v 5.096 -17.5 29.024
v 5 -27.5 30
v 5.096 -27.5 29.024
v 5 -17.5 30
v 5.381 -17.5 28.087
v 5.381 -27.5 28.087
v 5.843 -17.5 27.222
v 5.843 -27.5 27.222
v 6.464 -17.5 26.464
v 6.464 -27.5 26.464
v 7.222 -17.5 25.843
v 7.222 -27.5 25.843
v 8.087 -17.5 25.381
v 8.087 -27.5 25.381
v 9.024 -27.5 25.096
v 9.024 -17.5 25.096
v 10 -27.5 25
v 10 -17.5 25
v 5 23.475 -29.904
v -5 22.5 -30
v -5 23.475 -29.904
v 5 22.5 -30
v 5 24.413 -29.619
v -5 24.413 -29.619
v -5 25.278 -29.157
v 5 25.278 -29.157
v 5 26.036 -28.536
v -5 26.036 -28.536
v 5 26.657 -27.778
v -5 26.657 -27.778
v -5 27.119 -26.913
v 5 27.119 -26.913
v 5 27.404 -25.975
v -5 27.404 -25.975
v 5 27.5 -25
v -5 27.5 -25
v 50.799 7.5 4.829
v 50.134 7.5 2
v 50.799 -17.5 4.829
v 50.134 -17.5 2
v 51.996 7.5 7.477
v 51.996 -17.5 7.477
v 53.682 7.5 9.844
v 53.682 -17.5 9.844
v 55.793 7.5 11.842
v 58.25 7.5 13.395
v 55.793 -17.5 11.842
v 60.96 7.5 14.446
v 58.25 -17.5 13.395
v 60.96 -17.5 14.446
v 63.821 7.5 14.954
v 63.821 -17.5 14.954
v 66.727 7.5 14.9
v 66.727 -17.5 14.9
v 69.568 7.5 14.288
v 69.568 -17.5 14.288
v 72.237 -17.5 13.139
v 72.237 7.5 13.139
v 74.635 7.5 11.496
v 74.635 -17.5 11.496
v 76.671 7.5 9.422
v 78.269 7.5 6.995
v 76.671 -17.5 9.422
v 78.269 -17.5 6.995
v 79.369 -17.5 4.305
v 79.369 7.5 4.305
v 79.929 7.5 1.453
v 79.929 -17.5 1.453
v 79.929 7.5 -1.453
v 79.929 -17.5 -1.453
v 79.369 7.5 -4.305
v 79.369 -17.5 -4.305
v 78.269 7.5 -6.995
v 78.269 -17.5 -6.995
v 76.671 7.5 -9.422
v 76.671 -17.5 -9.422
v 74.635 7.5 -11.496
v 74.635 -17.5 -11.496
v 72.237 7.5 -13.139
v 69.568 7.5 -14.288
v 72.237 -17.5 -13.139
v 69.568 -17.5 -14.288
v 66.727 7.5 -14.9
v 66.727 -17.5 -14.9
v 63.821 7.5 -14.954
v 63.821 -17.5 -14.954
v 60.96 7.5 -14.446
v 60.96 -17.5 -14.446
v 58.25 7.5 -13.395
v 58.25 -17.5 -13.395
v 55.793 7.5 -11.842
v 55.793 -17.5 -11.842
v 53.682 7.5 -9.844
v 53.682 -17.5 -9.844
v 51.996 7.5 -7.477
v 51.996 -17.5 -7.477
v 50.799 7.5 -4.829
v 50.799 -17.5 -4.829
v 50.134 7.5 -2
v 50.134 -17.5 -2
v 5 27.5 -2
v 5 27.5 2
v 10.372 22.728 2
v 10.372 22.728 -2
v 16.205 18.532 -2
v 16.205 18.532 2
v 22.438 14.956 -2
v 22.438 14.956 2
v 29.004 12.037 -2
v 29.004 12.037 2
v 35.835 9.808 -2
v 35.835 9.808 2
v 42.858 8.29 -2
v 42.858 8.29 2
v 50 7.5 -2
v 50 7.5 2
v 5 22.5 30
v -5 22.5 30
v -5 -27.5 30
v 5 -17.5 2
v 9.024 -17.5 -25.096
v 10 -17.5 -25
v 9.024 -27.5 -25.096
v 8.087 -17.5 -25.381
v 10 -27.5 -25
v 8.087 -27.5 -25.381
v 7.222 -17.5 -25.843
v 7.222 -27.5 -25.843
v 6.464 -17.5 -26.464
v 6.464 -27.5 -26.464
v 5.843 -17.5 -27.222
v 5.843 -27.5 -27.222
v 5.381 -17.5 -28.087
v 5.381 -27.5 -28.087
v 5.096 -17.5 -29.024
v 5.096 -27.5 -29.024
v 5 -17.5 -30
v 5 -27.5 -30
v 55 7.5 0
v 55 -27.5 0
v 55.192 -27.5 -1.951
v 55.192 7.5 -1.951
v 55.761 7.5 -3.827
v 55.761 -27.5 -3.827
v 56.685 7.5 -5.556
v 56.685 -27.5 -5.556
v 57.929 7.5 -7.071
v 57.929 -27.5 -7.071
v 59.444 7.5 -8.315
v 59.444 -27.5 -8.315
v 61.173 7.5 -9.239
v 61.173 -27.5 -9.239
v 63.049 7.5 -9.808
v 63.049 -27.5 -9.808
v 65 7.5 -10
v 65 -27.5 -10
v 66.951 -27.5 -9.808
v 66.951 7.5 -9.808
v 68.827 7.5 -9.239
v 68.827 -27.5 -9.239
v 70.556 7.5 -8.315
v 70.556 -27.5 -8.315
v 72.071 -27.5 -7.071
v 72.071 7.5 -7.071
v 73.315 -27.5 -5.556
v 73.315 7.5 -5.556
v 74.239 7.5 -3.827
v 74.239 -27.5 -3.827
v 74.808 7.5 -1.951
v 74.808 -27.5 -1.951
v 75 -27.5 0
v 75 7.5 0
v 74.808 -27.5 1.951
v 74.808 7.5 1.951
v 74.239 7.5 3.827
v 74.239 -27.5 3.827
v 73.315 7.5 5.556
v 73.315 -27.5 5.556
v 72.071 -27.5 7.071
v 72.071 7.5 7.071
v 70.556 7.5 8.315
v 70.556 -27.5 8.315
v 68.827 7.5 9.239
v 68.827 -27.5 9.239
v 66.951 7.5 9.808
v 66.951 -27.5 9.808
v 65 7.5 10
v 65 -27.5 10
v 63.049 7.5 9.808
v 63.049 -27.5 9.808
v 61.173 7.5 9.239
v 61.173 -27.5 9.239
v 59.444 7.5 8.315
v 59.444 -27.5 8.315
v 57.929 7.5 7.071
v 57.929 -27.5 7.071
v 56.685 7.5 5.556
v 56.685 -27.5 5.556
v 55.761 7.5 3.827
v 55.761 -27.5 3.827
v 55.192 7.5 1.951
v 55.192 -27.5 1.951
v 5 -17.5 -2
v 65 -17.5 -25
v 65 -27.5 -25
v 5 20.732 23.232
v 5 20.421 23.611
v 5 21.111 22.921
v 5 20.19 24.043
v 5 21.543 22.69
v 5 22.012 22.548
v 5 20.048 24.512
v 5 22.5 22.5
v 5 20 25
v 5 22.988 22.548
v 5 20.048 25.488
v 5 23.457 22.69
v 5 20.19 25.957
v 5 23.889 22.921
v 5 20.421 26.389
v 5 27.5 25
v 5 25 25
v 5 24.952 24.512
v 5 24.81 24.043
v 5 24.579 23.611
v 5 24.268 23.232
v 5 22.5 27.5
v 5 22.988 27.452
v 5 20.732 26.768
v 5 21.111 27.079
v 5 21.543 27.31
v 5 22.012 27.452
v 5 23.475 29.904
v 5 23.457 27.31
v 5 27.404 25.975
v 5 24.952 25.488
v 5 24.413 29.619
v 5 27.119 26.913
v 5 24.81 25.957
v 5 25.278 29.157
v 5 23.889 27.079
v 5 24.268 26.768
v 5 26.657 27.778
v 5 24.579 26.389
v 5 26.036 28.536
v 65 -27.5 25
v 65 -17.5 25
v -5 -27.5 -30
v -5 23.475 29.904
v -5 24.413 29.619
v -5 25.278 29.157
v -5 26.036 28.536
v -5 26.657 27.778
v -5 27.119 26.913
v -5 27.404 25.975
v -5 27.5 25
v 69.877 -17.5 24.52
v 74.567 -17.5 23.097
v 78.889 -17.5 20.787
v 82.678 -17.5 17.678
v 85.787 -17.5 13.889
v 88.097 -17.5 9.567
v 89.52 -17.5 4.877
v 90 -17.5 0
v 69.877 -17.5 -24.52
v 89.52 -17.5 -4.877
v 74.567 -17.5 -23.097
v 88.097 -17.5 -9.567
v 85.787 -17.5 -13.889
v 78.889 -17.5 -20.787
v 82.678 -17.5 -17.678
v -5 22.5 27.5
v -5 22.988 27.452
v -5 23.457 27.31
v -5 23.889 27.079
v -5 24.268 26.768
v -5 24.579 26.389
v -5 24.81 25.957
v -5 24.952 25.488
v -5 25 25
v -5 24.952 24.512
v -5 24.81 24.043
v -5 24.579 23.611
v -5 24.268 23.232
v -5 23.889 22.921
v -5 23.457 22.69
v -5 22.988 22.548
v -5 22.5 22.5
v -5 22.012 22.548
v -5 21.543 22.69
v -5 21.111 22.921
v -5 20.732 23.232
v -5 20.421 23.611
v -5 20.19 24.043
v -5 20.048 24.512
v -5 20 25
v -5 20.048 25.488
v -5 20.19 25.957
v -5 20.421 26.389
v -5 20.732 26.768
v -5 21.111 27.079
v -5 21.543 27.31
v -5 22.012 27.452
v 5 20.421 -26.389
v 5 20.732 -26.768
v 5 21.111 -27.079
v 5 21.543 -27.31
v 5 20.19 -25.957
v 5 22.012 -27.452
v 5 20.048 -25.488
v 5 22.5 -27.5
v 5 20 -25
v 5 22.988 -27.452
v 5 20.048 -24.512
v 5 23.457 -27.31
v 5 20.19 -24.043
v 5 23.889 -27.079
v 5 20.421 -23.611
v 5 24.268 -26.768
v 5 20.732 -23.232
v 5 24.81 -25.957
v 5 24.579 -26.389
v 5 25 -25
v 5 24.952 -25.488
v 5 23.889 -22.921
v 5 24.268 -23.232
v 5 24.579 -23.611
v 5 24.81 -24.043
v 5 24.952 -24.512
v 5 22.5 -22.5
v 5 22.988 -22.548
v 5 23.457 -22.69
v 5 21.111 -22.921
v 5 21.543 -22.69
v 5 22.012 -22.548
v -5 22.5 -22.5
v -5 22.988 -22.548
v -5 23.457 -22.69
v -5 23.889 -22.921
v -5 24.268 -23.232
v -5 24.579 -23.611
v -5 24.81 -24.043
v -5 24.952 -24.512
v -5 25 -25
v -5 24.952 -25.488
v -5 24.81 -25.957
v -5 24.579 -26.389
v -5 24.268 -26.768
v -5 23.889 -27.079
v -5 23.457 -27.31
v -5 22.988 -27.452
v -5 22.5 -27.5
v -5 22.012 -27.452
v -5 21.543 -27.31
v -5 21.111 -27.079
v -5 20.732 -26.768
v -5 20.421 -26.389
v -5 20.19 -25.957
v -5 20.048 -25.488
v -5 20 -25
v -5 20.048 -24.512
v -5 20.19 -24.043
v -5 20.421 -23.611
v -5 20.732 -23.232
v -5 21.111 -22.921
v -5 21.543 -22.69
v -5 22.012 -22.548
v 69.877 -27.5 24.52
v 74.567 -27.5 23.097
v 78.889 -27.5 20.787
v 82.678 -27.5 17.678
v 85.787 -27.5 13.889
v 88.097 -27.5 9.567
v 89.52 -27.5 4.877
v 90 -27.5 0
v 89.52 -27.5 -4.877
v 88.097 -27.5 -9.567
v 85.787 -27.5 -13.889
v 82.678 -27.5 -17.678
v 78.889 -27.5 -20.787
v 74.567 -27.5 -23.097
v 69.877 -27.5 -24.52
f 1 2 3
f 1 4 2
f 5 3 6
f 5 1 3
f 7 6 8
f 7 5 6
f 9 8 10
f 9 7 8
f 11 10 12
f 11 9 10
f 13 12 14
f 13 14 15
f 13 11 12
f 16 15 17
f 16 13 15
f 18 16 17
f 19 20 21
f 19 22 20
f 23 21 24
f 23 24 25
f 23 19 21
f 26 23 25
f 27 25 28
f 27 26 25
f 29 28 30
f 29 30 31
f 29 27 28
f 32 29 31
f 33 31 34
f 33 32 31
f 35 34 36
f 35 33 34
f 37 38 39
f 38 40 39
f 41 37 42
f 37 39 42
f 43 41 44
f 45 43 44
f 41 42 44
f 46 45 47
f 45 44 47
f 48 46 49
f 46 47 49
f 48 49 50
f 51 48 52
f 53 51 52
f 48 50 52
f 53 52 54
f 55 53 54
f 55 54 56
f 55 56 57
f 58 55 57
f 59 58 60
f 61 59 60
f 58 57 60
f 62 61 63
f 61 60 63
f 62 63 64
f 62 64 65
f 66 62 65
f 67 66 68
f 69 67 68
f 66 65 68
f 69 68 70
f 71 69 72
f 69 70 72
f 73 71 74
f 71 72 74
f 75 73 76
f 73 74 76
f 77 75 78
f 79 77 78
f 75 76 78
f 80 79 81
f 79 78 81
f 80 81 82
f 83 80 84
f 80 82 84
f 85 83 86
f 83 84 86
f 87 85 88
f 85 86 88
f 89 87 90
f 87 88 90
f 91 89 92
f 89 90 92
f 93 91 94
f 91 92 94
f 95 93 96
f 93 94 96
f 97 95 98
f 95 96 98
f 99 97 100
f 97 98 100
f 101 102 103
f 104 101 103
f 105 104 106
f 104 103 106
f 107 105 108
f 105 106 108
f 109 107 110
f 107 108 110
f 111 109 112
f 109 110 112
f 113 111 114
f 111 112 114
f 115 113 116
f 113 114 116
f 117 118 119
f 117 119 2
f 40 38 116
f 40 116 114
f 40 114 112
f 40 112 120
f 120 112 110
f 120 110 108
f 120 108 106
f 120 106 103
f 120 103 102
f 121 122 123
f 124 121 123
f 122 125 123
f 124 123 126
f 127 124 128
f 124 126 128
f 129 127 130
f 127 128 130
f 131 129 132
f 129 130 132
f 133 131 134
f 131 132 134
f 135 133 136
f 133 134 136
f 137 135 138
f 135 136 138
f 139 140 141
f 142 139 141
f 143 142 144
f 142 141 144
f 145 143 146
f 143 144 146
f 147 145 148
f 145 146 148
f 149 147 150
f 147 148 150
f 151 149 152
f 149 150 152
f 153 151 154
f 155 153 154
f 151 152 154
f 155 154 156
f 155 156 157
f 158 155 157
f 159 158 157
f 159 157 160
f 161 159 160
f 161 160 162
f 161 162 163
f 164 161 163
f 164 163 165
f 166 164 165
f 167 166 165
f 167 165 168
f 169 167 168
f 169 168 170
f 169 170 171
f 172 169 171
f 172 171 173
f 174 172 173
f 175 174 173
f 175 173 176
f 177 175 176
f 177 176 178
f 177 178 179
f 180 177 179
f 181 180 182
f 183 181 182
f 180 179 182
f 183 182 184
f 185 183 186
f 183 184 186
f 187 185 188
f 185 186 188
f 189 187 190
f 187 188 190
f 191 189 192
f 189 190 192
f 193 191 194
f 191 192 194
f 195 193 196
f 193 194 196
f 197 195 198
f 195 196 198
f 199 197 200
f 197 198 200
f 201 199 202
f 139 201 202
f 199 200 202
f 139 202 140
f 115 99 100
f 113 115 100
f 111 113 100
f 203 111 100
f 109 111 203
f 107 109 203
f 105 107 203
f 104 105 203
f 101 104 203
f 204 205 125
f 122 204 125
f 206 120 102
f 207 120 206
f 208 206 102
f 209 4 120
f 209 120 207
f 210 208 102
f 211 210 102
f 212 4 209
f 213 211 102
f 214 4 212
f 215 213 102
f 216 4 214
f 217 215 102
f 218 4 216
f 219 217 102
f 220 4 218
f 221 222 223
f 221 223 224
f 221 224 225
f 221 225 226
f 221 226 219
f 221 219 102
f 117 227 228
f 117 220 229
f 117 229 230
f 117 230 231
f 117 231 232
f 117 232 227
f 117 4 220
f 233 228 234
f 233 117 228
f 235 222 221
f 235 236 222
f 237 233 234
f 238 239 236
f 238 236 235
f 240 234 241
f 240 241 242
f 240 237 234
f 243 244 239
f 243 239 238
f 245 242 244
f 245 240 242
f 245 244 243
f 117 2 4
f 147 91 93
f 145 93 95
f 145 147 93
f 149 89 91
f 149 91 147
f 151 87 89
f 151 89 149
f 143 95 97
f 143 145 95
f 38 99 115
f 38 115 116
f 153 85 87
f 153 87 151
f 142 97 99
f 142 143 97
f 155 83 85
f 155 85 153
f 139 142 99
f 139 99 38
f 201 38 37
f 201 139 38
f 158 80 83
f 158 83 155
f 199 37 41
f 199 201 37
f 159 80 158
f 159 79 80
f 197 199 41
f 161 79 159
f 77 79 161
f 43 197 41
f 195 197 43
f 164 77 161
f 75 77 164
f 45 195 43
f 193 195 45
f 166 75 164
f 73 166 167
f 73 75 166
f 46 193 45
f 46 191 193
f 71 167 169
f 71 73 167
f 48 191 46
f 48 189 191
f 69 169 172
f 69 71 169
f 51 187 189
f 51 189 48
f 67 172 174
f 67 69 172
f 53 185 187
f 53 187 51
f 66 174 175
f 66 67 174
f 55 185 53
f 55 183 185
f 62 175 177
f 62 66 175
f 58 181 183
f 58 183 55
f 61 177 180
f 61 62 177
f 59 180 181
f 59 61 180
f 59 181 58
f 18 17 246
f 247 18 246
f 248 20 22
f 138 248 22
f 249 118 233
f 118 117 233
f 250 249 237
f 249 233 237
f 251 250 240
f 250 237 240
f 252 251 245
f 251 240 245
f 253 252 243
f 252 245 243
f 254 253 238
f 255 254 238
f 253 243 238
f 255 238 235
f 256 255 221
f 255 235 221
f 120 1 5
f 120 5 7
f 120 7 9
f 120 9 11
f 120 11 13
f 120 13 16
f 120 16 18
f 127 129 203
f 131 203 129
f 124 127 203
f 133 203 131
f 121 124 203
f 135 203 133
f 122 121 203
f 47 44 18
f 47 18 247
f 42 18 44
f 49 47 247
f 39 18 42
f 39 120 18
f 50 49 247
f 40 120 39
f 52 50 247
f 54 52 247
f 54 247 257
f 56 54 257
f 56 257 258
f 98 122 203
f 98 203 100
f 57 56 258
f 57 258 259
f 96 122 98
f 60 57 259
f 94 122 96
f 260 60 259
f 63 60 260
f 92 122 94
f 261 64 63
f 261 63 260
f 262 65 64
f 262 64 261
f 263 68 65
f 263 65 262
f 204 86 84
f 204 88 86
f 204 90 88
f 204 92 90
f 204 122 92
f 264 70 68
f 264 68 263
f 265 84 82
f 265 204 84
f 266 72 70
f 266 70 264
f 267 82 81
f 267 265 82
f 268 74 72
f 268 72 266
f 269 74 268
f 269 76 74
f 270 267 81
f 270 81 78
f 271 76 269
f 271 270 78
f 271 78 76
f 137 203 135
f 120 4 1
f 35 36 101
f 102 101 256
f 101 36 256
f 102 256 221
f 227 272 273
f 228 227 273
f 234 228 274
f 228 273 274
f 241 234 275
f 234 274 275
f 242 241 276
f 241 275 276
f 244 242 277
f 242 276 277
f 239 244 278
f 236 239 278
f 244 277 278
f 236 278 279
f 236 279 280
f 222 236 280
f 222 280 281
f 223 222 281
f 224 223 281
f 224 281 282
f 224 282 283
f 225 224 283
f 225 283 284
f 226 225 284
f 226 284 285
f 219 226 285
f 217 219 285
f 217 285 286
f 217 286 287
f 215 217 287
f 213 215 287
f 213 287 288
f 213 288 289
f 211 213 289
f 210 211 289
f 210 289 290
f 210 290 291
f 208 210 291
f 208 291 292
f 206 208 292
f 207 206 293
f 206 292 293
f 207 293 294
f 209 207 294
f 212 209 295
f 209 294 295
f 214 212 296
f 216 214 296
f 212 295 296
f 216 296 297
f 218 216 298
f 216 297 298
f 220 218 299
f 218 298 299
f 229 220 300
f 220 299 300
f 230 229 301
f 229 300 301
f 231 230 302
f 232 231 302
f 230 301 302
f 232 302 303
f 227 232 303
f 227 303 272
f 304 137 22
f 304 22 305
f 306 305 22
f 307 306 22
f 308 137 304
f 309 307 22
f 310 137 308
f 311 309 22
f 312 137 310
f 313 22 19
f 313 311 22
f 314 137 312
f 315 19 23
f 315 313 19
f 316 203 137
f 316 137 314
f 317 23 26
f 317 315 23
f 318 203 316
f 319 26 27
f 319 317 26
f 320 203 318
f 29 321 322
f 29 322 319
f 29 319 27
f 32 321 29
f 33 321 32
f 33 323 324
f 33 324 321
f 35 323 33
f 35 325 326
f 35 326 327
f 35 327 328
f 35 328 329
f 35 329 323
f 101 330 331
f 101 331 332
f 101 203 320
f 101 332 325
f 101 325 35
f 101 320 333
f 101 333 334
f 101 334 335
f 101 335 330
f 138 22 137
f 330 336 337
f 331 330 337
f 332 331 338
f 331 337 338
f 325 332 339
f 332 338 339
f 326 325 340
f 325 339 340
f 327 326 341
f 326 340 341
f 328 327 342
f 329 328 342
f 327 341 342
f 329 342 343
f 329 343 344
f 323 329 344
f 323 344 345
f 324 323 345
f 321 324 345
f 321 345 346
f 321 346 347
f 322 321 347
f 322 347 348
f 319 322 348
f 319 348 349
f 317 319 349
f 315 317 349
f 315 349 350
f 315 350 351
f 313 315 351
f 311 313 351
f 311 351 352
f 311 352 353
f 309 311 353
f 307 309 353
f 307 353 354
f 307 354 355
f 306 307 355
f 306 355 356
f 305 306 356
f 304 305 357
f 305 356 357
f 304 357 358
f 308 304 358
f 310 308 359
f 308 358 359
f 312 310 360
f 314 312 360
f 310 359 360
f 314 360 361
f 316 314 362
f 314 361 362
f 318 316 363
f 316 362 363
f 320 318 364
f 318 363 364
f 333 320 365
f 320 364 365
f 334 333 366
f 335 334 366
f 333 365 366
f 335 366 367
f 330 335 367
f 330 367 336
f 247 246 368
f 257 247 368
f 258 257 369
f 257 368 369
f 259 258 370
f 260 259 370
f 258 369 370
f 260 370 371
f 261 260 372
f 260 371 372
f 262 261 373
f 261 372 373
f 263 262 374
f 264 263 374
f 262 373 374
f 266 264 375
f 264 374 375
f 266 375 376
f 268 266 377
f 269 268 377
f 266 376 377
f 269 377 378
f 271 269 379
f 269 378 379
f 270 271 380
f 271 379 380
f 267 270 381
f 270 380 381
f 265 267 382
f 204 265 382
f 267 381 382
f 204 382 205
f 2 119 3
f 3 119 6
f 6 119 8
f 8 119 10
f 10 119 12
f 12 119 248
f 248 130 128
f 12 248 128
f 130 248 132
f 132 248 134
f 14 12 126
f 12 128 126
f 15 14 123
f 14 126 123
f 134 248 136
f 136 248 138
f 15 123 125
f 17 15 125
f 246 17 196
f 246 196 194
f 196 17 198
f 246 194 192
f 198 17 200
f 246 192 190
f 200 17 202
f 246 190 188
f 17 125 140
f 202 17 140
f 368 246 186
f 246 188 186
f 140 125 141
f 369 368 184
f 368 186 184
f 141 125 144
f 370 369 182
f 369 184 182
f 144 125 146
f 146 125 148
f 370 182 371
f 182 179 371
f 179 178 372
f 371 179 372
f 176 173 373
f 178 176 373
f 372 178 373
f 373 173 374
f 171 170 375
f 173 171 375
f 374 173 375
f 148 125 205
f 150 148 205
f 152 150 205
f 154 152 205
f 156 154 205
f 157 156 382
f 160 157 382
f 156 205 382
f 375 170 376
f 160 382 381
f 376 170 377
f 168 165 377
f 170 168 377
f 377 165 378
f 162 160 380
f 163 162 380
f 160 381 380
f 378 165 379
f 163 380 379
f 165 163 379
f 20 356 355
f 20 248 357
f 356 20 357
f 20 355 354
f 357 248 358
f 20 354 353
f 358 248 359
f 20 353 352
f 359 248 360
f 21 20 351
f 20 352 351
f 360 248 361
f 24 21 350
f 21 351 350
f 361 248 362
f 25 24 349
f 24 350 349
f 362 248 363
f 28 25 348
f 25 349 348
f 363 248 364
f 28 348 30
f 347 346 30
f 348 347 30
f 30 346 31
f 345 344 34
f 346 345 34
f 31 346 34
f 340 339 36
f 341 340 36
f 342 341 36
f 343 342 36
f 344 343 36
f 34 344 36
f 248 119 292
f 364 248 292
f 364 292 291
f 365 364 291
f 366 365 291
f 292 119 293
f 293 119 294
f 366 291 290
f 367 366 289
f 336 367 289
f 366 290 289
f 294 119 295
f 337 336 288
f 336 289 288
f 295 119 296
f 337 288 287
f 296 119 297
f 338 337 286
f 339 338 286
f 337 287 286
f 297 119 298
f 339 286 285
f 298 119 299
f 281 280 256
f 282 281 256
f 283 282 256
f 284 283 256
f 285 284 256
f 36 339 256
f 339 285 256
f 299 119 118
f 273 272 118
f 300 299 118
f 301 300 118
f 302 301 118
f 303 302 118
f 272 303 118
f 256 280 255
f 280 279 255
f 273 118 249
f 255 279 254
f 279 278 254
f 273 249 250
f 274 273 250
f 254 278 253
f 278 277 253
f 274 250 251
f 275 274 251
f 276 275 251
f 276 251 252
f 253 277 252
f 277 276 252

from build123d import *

# Parameters (mm, degrees)
SKETCH1_W           = 10
SKETCH1_H           = 55
BOSS_EXTRUDE1_DEPTH = 30
BOSS_EXTRUDE2_START = -27.5
BOSS_EXTRUDE2_DEPTH = 10
FILLET3_R           = 5
FILLET4_R           = 5
SKETCH3_R           = 15
BOSS_EXTRUDE3_DEPTH = 25
HOLE1_D             = 20
FILLET5_R           = 5
HOLE2_D             = 5
BOSS_EXTRUDE7_DEPTH = 2


with BuildPart() as part:
    # Sketch1 → Boss-Extrude1 (new, symmetric)
    with BuildSketch(Plane.XY):
        Rectangle(SKETCH1_W, SKETCH1_H)
    extrude(amount=BOSS_EXTRUDE1_DEPTH, both=True)

    # Sketch2 → Boss-Extrude2 (add)
    with BuildSketch(Plane(origin=(0, 0, 0), x_dir=(1, 0, 0), z_dir=(0, 1, 0)).offset(BOSS_EXTRUDE2_START)):
        with BuildLine():
            Line((65, 25), (3, 25))
            Line((3, 25), (3, -25))
            Line((3, -25), (65, -25))
            ThreePointArc((65, -25), (90, 0), (65, 25))
        make_face()
    extrude(amount=BOSS_EXTRUDE2_DEPTH)

    # Fillet3
    fillet3_edges = [part.edges().sort_by_distance(p)[0] for p in [
        (5, -22.5, 25),
    ]]
    fillet(fillet3_edges, radius=FILLET3_R - 0.0001)  # a hair under: the kernel refuses the full size

    # Fillet4
    fillet4_edges = [part.edges().sort_by_distance(p)[0] for p in [
        (5, -22.5, -25),
    ]]
    fillet(fillet4_edges, radius=FILLET4_R - 0.0001)  # a hair under: the kernel refuses the full size

    # Sketch3 → Boss-Extrude3 (add)
    with BuildSketch(Plane(origin=(0, -17.5, 0), x_dir=(1, 0, 0), z_dir=(0, 1, 0))):
        with Locations(Location((65, 0, 0), (0, 0, 270))):
            Circle(SKETCH3_R)
    extrude(amount=BOSS_EXTRUDE3_DEPTH)

    # Hole1 (through all)
    with Locations(Plane(origin=(0, 7.5, 0), x_dir=(1, 0, 0), z_dir=(0, 1, 0))):
        with Locations((65, 0)):
            Hole(HOLE1_D / 2)

    # Fillet5
    fillet5_edges = [part.edges().sort_by_distance(p)[0] for p in [
        (0, 27.5, -30),
        (0, 27.5, 30),
    ]]
    fillet(fillet5_edges, radius=FILLET5_R)

    # Hole2 (through all)
    with Locations(Plane(origin=(5, 0, 0), x_dir=(0, 0, -1), z_dir=(1, 0, 0))):
        with Locations((-25, 22.5), (25, 22.5)):
            Hole(HOLE2_D / 2)

    # Sketch9 → Boss-Extrude7 (add, symmetric)
    with BuildSketch(Plane.XY):
        with BuildLine():
            Line((51.5, 7.5), (51.5, -17.5))
            Line((51.5, -17.5), (10, -17.5))
            Line((10, -17.5), (5, -17.5))
            Line((5, -17.5), (3, -17.5))
            Line((3, -17.5), (3, 27.5))
            Line((3, 27.5), (5, 27.5))
            ThreePointArc((5, 27.5), (25.683225718, 13.412257866), (50, 7.5))
            Line((50, 7.5), (51.5, 7.5))
        make_face()
    extrude(amount=BOSS_EXTRUDE7_DEPTH, both=True)


solid = part.part
